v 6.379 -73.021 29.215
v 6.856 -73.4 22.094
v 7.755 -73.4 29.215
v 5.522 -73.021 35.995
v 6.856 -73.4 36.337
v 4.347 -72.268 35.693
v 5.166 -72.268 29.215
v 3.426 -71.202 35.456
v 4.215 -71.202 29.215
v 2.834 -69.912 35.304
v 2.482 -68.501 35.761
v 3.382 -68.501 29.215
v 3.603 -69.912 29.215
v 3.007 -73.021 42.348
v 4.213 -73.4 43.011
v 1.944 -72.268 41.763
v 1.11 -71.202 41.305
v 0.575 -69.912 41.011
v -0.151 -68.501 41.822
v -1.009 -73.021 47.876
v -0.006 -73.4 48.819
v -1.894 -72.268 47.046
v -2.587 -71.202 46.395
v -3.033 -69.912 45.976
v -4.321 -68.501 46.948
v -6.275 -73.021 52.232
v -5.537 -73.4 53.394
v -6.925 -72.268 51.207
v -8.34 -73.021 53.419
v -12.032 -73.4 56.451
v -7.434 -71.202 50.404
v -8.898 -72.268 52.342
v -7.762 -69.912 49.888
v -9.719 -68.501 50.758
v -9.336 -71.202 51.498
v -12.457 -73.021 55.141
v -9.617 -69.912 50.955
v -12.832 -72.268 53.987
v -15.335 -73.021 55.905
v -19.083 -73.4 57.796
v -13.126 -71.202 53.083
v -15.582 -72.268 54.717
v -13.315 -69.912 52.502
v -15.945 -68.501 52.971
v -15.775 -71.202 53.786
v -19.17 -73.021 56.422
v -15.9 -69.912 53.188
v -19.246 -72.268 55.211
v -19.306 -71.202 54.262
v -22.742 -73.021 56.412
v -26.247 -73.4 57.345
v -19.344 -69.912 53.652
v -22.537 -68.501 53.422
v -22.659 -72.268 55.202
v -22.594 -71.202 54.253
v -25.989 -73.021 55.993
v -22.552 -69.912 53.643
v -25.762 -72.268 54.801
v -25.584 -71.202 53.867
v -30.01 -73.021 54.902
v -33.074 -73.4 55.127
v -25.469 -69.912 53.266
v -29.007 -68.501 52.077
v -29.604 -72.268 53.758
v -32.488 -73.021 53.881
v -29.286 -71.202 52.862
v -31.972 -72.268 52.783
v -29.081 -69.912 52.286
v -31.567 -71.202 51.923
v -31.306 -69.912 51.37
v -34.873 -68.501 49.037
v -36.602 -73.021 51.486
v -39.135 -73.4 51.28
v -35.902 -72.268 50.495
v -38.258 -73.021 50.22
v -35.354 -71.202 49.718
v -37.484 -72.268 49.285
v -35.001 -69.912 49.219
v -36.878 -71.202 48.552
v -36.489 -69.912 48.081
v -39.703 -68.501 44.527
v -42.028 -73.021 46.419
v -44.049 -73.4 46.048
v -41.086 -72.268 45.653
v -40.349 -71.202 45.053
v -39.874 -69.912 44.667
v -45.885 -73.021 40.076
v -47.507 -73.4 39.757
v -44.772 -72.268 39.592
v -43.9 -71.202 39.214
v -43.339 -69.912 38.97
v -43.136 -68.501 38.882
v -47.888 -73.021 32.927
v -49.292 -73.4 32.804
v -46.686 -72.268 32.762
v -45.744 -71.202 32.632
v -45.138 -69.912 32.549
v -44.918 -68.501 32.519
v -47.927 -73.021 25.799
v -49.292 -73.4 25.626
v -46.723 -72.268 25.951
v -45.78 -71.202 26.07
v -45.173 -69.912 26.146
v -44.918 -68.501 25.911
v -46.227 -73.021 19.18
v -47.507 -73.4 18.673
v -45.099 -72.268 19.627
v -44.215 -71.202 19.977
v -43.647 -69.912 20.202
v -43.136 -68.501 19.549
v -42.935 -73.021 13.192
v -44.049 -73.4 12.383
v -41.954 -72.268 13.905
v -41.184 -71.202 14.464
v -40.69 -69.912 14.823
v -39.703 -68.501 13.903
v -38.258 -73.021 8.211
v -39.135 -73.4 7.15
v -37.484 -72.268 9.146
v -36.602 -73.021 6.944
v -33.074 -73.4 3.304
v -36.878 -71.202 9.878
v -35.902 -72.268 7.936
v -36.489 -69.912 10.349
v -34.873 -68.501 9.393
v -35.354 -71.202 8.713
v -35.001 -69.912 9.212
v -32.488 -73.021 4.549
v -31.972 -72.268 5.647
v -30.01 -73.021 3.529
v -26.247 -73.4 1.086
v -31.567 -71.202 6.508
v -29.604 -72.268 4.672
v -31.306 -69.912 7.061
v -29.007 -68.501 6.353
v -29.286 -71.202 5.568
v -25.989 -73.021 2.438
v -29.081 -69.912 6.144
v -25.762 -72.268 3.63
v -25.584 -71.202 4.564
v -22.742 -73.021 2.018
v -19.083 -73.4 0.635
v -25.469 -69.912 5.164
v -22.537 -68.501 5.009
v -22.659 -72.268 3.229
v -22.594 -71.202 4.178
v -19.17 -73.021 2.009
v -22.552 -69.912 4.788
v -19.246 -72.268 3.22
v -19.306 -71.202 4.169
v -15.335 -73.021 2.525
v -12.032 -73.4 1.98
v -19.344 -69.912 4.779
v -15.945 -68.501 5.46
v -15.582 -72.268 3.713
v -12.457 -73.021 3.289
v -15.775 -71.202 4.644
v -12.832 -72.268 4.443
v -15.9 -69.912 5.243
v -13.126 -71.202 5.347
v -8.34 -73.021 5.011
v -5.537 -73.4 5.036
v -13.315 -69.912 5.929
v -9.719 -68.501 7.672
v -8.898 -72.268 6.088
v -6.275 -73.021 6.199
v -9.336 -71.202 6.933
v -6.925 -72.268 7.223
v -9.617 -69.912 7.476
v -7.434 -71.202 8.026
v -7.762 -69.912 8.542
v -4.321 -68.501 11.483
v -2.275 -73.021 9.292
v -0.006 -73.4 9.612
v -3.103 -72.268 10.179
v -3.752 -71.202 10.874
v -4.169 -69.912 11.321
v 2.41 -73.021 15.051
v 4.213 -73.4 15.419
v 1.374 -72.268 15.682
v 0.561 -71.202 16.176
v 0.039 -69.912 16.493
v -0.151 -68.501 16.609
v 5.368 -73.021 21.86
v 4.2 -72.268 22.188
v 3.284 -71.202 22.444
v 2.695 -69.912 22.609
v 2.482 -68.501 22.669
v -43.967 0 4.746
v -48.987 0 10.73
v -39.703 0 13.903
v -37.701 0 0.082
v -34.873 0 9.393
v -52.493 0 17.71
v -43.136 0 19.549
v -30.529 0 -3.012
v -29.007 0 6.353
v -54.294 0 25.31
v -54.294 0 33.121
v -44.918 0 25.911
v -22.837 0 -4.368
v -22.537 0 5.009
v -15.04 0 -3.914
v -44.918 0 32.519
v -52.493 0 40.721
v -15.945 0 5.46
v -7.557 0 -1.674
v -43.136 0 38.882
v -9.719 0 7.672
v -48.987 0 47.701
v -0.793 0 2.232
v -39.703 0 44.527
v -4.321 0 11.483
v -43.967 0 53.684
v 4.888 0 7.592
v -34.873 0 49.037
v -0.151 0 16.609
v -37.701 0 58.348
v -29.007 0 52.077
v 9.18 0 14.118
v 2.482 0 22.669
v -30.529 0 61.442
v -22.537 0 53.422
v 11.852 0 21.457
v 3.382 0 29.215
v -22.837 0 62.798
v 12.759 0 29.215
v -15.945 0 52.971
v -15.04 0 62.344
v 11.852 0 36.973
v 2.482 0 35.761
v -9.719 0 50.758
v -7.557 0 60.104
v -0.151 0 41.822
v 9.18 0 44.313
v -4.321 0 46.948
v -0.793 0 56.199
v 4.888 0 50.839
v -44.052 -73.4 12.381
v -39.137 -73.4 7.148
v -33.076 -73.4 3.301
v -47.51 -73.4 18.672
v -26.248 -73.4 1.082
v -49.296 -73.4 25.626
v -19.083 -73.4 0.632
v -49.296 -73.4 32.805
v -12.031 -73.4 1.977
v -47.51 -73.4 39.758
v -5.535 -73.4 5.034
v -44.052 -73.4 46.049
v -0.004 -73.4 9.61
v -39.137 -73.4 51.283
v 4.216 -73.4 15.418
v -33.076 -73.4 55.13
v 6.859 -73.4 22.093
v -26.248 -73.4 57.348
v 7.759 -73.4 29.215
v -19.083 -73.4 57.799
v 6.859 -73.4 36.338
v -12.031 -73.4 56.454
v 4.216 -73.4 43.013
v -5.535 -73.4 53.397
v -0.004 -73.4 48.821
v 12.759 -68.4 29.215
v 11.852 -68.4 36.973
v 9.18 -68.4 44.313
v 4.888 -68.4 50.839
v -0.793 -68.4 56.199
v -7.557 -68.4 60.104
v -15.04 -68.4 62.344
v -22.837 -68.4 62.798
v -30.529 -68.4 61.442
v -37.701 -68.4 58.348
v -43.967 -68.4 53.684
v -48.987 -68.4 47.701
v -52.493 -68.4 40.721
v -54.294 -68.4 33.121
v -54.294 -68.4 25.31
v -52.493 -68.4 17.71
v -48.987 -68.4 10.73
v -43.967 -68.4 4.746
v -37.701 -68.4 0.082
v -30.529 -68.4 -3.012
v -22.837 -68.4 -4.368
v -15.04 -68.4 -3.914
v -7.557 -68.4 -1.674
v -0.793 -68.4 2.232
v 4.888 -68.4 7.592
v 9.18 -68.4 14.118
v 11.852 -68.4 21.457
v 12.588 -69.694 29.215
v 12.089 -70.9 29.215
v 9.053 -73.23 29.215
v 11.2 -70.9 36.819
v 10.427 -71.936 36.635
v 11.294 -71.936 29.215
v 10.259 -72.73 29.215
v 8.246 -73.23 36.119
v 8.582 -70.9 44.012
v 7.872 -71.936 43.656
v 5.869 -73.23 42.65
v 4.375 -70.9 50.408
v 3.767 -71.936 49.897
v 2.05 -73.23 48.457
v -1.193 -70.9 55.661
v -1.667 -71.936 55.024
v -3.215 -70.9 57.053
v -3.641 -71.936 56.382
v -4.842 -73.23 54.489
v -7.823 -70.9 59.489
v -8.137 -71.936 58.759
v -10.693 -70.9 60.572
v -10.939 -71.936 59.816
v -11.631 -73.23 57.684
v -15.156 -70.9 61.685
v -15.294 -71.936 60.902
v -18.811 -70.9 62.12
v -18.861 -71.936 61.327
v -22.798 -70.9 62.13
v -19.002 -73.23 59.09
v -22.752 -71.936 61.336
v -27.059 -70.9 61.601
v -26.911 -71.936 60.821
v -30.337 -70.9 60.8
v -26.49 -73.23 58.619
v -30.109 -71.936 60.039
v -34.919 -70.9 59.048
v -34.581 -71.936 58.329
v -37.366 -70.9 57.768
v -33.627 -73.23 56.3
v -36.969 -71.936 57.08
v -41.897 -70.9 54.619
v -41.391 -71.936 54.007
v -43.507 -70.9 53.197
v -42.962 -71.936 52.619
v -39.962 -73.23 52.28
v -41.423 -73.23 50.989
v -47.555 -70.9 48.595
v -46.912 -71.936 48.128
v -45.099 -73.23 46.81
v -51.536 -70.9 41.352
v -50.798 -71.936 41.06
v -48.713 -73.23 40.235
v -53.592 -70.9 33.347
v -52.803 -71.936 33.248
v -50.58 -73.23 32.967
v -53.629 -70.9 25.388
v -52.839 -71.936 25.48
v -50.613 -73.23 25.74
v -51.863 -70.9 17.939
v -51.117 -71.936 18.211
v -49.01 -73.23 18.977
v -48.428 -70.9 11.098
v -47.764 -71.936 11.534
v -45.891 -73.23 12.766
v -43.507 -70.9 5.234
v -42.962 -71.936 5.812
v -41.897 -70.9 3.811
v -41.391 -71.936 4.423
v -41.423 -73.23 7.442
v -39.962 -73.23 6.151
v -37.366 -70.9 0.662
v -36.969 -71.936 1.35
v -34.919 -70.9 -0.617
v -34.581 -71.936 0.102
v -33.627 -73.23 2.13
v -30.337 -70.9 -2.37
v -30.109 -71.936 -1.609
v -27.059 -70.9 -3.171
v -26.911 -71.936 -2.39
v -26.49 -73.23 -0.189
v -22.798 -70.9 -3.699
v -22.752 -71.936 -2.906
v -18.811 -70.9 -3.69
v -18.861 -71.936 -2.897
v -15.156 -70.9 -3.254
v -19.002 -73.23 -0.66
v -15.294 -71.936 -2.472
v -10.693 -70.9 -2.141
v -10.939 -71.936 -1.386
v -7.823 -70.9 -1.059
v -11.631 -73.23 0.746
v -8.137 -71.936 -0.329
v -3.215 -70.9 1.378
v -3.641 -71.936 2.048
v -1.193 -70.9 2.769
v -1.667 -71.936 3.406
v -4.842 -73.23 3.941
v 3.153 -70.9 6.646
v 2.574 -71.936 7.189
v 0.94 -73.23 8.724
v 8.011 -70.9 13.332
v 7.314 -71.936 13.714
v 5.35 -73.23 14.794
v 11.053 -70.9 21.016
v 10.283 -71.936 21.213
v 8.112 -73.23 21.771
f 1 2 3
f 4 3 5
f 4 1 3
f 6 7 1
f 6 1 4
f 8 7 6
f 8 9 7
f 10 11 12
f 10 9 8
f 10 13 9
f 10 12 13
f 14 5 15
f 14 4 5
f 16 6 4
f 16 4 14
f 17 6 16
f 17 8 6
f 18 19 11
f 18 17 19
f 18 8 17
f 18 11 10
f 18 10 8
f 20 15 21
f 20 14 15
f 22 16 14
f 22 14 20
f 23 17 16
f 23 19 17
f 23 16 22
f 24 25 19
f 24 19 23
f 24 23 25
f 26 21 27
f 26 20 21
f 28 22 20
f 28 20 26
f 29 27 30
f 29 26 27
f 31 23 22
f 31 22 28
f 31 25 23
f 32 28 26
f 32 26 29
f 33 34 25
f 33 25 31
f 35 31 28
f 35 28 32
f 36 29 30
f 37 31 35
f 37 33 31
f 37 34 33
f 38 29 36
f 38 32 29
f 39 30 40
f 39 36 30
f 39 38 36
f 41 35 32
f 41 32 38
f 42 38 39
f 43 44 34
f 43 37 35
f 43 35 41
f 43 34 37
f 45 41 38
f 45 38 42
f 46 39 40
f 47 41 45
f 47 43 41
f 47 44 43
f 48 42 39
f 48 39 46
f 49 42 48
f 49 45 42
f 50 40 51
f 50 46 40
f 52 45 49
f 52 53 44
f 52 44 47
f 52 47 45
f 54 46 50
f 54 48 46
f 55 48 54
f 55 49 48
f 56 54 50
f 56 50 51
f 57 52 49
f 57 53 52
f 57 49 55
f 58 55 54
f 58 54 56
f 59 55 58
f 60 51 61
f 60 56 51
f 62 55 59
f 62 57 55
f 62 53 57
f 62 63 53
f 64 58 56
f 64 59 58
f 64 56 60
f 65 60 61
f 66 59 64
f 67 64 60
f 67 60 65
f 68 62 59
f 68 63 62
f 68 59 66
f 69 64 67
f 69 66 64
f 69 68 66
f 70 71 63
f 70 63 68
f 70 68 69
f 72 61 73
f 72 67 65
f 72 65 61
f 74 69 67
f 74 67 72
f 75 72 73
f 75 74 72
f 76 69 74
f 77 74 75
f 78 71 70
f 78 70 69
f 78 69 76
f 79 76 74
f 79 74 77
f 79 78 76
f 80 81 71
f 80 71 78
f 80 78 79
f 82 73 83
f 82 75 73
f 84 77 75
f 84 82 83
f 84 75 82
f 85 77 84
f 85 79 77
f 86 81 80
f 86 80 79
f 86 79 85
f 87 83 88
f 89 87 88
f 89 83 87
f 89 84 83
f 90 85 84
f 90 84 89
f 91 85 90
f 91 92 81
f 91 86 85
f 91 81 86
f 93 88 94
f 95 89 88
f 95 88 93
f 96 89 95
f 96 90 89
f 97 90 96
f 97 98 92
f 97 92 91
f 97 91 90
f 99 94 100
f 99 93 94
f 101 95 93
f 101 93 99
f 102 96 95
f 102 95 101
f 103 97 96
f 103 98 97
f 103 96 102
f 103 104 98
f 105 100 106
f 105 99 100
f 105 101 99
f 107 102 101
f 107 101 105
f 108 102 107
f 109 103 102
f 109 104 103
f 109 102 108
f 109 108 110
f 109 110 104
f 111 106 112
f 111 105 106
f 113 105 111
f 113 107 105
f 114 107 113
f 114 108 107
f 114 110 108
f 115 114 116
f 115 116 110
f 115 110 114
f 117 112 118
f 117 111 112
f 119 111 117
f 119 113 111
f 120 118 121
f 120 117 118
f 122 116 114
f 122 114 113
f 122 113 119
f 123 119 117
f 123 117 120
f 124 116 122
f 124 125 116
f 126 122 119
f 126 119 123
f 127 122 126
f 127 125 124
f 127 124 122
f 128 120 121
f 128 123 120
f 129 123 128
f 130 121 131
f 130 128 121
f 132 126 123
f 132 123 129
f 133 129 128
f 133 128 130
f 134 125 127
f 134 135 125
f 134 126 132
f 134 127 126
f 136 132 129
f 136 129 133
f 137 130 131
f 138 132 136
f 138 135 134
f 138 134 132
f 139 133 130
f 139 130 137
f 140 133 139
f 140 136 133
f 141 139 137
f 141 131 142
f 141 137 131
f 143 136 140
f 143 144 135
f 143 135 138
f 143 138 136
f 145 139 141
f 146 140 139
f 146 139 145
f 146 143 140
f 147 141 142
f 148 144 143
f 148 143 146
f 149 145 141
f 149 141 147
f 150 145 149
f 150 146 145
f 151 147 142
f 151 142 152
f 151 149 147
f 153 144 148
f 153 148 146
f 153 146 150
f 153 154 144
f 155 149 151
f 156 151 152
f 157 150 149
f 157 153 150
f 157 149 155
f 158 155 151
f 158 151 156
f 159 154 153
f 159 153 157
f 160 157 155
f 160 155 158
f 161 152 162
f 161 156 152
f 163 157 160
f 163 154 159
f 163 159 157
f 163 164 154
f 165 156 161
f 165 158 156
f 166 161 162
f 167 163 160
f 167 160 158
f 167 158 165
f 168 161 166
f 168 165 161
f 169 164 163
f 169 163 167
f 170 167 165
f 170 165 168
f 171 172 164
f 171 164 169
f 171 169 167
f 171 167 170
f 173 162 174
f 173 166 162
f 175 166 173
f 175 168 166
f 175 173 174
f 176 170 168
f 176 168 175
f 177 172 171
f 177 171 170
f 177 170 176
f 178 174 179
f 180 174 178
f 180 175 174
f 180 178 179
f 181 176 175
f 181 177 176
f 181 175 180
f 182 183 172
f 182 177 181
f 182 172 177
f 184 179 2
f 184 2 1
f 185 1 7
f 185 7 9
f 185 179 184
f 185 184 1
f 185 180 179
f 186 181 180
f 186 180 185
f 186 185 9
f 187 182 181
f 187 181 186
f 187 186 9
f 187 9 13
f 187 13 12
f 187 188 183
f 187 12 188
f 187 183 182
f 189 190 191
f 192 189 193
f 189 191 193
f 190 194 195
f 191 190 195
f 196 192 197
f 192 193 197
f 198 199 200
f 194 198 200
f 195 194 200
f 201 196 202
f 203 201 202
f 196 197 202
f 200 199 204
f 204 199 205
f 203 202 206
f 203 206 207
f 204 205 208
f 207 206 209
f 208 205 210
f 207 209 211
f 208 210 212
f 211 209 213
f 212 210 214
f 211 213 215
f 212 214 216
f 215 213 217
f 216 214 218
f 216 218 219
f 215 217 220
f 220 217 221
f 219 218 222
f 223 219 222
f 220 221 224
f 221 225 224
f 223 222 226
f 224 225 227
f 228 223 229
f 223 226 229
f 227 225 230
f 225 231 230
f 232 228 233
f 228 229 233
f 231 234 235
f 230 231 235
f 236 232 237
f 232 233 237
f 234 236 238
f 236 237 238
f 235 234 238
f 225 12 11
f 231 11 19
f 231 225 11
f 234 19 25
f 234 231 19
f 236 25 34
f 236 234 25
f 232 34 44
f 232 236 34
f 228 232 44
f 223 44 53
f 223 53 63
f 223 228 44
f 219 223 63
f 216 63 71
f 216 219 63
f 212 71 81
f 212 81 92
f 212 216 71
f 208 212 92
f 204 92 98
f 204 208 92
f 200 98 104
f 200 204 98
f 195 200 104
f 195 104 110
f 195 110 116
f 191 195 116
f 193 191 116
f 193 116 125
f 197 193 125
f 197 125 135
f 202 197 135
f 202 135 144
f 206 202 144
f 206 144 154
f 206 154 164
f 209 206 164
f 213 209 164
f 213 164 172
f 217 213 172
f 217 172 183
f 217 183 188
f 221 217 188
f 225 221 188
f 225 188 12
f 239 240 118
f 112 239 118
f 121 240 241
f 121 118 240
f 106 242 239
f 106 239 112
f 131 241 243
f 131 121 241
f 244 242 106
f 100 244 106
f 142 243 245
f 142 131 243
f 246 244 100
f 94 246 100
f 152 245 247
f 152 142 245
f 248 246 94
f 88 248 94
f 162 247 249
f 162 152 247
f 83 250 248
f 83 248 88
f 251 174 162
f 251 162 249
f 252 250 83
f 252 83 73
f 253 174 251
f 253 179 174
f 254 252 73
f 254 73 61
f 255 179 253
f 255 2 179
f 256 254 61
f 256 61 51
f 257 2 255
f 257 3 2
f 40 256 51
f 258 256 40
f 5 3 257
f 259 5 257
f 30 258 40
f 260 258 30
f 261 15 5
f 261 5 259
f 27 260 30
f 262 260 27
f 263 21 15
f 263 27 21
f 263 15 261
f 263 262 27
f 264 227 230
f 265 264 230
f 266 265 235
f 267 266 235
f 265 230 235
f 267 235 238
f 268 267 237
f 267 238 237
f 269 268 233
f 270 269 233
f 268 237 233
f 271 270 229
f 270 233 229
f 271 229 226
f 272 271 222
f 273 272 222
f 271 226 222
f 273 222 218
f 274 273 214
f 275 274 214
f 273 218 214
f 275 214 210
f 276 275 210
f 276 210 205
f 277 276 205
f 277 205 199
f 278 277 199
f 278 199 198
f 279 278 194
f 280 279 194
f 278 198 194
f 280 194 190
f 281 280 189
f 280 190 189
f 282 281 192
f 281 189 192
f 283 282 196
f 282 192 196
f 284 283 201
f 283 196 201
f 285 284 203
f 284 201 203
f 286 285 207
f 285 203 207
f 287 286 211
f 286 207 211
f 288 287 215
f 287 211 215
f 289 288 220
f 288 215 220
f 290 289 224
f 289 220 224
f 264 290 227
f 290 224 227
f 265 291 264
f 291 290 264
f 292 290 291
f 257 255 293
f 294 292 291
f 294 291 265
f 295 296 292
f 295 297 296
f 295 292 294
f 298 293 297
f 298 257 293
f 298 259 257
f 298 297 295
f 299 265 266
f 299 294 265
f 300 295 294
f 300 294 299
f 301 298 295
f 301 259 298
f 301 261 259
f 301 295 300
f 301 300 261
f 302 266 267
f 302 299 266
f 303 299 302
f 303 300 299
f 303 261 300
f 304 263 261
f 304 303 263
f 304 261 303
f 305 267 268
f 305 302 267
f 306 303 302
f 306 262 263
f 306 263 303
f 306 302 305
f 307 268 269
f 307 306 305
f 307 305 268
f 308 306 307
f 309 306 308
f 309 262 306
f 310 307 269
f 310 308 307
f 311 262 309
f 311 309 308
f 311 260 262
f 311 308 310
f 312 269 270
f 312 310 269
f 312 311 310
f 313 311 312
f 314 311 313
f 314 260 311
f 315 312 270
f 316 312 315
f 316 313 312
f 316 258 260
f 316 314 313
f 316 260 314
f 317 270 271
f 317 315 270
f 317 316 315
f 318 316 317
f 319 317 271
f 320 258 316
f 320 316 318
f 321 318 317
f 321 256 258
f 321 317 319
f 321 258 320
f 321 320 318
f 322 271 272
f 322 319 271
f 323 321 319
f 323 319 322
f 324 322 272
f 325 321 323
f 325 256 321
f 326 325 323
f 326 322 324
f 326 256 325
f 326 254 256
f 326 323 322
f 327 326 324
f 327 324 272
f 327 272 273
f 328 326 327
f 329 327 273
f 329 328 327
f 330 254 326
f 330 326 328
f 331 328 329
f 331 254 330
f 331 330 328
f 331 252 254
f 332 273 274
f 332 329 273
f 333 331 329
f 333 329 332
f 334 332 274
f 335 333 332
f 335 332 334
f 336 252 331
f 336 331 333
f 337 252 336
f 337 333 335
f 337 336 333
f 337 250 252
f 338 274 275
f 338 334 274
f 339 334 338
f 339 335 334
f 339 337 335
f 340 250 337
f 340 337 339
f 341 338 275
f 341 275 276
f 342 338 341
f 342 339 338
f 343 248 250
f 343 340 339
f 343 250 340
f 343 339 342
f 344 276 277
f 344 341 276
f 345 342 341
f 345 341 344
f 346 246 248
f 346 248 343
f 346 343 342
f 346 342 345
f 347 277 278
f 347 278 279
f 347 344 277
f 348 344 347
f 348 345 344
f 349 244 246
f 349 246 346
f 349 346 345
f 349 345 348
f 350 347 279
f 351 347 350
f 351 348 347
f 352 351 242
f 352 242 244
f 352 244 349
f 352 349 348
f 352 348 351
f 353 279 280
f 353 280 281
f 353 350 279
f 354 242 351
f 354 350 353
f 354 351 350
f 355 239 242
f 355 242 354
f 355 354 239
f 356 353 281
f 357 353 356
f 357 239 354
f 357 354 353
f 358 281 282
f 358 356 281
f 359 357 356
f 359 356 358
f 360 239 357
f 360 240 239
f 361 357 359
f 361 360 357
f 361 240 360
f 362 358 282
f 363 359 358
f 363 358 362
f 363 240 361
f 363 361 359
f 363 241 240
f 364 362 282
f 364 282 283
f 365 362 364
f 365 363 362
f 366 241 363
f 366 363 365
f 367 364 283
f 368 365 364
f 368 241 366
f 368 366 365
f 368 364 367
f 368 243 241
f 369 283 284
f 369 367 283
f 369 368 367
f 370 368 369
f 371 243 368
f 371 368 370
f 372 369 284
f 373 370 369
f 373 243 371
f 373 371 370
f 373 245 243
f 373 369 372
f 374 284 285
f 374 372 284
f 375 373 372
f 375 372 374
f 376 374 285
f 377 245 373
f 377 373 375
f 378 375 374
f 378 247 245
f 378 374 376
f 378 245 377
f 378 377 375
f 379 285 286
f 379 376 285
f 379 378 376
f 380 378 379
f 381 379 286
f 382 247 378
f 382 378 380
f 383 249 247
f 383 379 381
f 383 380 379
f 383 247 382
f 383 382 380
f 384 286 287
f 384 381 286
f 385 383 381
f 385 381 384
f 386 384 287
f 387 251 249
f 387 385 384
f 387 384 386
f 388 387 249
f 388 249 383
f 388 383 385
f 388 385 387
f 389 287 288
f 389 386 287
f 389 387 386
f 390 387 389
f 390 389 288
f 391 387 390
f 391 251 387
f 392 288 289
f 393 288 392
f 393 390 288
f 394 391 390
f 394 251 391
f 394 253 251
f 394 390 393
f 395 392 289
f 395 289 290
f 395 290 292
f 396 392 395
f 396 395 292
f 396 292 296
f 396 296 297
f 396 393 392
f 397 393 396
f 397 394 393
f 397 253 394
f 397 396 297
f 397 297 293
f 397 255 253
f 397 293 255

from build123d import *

# Parameters (mm, degrees)
F0_R     = 33.6400886769
F0_R_2   = 24.263041798
F1_DEPTH = 73.4
F2_R     = 5


# Not quite as in the source:
# - a fillet or chamfer that OpenCascade refuses, or shapes differently, is made with other operations: its cross-section is extruded or revolved along the edge and cut away or added


with BuildPart() as f1:
    # F0 (on Front) → F1 (new body)
    with BuildSketch(Plane.XZ):
        with Locations((-20.8813920617, 29.2152203619)):
            Circle(F0_R)
        with Locations((-20.8813920617, 29.2152203619)):
            Circle(F0_R_2, mode=Mode.SUBTRACT)
    extrude(amount=F1_DEPTH)

    # F2
    f2_edges = [f1.edges().sort_by_distance(p)[0] for p in [
        (-54.521481, -73.4, 29.21522),
    ]]
    fillet(f2_edges, radius=F2_R)

    # F3: fillet of radius 5 on 1 edges, made by hand

    # F3_s1 → F3_t2 (revolve, cut)
    with BuildSketch(Plane.XY.offset(29.2152203619)):
        with BuildLine():
            ThreePointArc((7.7586467113, -73.4003968748), (4.6319918458, -71.7466536397), (3.3812497363, -68.4381069026))
            Line((3.3812497363, -68.4381069026), (2.8811131677, -68.4381069026))
            ThreePointArc((2.8811131677, -68.4381069026), (2.8815131677, -70.9190534513), (2.8815131677, -73.4))
            Line((2.8815131677, -73.4), (3.3816497363, -73.9001365685))
            ThreePointArc((3.3816497363, -73.9001365685), (5.5701482238, -73.9001365685), (7.6962498403, -73.896625872))
            Line((7.6962498403, -73.896625872), (7.7586467113, -73.4003968748))
        make_face()
    revolve(axis=Axis((-20.8813920617, -73.4, 29.2152203619), (0, -1, 0)), mode=Mode.SUBTRACT)


solid = f1.part
